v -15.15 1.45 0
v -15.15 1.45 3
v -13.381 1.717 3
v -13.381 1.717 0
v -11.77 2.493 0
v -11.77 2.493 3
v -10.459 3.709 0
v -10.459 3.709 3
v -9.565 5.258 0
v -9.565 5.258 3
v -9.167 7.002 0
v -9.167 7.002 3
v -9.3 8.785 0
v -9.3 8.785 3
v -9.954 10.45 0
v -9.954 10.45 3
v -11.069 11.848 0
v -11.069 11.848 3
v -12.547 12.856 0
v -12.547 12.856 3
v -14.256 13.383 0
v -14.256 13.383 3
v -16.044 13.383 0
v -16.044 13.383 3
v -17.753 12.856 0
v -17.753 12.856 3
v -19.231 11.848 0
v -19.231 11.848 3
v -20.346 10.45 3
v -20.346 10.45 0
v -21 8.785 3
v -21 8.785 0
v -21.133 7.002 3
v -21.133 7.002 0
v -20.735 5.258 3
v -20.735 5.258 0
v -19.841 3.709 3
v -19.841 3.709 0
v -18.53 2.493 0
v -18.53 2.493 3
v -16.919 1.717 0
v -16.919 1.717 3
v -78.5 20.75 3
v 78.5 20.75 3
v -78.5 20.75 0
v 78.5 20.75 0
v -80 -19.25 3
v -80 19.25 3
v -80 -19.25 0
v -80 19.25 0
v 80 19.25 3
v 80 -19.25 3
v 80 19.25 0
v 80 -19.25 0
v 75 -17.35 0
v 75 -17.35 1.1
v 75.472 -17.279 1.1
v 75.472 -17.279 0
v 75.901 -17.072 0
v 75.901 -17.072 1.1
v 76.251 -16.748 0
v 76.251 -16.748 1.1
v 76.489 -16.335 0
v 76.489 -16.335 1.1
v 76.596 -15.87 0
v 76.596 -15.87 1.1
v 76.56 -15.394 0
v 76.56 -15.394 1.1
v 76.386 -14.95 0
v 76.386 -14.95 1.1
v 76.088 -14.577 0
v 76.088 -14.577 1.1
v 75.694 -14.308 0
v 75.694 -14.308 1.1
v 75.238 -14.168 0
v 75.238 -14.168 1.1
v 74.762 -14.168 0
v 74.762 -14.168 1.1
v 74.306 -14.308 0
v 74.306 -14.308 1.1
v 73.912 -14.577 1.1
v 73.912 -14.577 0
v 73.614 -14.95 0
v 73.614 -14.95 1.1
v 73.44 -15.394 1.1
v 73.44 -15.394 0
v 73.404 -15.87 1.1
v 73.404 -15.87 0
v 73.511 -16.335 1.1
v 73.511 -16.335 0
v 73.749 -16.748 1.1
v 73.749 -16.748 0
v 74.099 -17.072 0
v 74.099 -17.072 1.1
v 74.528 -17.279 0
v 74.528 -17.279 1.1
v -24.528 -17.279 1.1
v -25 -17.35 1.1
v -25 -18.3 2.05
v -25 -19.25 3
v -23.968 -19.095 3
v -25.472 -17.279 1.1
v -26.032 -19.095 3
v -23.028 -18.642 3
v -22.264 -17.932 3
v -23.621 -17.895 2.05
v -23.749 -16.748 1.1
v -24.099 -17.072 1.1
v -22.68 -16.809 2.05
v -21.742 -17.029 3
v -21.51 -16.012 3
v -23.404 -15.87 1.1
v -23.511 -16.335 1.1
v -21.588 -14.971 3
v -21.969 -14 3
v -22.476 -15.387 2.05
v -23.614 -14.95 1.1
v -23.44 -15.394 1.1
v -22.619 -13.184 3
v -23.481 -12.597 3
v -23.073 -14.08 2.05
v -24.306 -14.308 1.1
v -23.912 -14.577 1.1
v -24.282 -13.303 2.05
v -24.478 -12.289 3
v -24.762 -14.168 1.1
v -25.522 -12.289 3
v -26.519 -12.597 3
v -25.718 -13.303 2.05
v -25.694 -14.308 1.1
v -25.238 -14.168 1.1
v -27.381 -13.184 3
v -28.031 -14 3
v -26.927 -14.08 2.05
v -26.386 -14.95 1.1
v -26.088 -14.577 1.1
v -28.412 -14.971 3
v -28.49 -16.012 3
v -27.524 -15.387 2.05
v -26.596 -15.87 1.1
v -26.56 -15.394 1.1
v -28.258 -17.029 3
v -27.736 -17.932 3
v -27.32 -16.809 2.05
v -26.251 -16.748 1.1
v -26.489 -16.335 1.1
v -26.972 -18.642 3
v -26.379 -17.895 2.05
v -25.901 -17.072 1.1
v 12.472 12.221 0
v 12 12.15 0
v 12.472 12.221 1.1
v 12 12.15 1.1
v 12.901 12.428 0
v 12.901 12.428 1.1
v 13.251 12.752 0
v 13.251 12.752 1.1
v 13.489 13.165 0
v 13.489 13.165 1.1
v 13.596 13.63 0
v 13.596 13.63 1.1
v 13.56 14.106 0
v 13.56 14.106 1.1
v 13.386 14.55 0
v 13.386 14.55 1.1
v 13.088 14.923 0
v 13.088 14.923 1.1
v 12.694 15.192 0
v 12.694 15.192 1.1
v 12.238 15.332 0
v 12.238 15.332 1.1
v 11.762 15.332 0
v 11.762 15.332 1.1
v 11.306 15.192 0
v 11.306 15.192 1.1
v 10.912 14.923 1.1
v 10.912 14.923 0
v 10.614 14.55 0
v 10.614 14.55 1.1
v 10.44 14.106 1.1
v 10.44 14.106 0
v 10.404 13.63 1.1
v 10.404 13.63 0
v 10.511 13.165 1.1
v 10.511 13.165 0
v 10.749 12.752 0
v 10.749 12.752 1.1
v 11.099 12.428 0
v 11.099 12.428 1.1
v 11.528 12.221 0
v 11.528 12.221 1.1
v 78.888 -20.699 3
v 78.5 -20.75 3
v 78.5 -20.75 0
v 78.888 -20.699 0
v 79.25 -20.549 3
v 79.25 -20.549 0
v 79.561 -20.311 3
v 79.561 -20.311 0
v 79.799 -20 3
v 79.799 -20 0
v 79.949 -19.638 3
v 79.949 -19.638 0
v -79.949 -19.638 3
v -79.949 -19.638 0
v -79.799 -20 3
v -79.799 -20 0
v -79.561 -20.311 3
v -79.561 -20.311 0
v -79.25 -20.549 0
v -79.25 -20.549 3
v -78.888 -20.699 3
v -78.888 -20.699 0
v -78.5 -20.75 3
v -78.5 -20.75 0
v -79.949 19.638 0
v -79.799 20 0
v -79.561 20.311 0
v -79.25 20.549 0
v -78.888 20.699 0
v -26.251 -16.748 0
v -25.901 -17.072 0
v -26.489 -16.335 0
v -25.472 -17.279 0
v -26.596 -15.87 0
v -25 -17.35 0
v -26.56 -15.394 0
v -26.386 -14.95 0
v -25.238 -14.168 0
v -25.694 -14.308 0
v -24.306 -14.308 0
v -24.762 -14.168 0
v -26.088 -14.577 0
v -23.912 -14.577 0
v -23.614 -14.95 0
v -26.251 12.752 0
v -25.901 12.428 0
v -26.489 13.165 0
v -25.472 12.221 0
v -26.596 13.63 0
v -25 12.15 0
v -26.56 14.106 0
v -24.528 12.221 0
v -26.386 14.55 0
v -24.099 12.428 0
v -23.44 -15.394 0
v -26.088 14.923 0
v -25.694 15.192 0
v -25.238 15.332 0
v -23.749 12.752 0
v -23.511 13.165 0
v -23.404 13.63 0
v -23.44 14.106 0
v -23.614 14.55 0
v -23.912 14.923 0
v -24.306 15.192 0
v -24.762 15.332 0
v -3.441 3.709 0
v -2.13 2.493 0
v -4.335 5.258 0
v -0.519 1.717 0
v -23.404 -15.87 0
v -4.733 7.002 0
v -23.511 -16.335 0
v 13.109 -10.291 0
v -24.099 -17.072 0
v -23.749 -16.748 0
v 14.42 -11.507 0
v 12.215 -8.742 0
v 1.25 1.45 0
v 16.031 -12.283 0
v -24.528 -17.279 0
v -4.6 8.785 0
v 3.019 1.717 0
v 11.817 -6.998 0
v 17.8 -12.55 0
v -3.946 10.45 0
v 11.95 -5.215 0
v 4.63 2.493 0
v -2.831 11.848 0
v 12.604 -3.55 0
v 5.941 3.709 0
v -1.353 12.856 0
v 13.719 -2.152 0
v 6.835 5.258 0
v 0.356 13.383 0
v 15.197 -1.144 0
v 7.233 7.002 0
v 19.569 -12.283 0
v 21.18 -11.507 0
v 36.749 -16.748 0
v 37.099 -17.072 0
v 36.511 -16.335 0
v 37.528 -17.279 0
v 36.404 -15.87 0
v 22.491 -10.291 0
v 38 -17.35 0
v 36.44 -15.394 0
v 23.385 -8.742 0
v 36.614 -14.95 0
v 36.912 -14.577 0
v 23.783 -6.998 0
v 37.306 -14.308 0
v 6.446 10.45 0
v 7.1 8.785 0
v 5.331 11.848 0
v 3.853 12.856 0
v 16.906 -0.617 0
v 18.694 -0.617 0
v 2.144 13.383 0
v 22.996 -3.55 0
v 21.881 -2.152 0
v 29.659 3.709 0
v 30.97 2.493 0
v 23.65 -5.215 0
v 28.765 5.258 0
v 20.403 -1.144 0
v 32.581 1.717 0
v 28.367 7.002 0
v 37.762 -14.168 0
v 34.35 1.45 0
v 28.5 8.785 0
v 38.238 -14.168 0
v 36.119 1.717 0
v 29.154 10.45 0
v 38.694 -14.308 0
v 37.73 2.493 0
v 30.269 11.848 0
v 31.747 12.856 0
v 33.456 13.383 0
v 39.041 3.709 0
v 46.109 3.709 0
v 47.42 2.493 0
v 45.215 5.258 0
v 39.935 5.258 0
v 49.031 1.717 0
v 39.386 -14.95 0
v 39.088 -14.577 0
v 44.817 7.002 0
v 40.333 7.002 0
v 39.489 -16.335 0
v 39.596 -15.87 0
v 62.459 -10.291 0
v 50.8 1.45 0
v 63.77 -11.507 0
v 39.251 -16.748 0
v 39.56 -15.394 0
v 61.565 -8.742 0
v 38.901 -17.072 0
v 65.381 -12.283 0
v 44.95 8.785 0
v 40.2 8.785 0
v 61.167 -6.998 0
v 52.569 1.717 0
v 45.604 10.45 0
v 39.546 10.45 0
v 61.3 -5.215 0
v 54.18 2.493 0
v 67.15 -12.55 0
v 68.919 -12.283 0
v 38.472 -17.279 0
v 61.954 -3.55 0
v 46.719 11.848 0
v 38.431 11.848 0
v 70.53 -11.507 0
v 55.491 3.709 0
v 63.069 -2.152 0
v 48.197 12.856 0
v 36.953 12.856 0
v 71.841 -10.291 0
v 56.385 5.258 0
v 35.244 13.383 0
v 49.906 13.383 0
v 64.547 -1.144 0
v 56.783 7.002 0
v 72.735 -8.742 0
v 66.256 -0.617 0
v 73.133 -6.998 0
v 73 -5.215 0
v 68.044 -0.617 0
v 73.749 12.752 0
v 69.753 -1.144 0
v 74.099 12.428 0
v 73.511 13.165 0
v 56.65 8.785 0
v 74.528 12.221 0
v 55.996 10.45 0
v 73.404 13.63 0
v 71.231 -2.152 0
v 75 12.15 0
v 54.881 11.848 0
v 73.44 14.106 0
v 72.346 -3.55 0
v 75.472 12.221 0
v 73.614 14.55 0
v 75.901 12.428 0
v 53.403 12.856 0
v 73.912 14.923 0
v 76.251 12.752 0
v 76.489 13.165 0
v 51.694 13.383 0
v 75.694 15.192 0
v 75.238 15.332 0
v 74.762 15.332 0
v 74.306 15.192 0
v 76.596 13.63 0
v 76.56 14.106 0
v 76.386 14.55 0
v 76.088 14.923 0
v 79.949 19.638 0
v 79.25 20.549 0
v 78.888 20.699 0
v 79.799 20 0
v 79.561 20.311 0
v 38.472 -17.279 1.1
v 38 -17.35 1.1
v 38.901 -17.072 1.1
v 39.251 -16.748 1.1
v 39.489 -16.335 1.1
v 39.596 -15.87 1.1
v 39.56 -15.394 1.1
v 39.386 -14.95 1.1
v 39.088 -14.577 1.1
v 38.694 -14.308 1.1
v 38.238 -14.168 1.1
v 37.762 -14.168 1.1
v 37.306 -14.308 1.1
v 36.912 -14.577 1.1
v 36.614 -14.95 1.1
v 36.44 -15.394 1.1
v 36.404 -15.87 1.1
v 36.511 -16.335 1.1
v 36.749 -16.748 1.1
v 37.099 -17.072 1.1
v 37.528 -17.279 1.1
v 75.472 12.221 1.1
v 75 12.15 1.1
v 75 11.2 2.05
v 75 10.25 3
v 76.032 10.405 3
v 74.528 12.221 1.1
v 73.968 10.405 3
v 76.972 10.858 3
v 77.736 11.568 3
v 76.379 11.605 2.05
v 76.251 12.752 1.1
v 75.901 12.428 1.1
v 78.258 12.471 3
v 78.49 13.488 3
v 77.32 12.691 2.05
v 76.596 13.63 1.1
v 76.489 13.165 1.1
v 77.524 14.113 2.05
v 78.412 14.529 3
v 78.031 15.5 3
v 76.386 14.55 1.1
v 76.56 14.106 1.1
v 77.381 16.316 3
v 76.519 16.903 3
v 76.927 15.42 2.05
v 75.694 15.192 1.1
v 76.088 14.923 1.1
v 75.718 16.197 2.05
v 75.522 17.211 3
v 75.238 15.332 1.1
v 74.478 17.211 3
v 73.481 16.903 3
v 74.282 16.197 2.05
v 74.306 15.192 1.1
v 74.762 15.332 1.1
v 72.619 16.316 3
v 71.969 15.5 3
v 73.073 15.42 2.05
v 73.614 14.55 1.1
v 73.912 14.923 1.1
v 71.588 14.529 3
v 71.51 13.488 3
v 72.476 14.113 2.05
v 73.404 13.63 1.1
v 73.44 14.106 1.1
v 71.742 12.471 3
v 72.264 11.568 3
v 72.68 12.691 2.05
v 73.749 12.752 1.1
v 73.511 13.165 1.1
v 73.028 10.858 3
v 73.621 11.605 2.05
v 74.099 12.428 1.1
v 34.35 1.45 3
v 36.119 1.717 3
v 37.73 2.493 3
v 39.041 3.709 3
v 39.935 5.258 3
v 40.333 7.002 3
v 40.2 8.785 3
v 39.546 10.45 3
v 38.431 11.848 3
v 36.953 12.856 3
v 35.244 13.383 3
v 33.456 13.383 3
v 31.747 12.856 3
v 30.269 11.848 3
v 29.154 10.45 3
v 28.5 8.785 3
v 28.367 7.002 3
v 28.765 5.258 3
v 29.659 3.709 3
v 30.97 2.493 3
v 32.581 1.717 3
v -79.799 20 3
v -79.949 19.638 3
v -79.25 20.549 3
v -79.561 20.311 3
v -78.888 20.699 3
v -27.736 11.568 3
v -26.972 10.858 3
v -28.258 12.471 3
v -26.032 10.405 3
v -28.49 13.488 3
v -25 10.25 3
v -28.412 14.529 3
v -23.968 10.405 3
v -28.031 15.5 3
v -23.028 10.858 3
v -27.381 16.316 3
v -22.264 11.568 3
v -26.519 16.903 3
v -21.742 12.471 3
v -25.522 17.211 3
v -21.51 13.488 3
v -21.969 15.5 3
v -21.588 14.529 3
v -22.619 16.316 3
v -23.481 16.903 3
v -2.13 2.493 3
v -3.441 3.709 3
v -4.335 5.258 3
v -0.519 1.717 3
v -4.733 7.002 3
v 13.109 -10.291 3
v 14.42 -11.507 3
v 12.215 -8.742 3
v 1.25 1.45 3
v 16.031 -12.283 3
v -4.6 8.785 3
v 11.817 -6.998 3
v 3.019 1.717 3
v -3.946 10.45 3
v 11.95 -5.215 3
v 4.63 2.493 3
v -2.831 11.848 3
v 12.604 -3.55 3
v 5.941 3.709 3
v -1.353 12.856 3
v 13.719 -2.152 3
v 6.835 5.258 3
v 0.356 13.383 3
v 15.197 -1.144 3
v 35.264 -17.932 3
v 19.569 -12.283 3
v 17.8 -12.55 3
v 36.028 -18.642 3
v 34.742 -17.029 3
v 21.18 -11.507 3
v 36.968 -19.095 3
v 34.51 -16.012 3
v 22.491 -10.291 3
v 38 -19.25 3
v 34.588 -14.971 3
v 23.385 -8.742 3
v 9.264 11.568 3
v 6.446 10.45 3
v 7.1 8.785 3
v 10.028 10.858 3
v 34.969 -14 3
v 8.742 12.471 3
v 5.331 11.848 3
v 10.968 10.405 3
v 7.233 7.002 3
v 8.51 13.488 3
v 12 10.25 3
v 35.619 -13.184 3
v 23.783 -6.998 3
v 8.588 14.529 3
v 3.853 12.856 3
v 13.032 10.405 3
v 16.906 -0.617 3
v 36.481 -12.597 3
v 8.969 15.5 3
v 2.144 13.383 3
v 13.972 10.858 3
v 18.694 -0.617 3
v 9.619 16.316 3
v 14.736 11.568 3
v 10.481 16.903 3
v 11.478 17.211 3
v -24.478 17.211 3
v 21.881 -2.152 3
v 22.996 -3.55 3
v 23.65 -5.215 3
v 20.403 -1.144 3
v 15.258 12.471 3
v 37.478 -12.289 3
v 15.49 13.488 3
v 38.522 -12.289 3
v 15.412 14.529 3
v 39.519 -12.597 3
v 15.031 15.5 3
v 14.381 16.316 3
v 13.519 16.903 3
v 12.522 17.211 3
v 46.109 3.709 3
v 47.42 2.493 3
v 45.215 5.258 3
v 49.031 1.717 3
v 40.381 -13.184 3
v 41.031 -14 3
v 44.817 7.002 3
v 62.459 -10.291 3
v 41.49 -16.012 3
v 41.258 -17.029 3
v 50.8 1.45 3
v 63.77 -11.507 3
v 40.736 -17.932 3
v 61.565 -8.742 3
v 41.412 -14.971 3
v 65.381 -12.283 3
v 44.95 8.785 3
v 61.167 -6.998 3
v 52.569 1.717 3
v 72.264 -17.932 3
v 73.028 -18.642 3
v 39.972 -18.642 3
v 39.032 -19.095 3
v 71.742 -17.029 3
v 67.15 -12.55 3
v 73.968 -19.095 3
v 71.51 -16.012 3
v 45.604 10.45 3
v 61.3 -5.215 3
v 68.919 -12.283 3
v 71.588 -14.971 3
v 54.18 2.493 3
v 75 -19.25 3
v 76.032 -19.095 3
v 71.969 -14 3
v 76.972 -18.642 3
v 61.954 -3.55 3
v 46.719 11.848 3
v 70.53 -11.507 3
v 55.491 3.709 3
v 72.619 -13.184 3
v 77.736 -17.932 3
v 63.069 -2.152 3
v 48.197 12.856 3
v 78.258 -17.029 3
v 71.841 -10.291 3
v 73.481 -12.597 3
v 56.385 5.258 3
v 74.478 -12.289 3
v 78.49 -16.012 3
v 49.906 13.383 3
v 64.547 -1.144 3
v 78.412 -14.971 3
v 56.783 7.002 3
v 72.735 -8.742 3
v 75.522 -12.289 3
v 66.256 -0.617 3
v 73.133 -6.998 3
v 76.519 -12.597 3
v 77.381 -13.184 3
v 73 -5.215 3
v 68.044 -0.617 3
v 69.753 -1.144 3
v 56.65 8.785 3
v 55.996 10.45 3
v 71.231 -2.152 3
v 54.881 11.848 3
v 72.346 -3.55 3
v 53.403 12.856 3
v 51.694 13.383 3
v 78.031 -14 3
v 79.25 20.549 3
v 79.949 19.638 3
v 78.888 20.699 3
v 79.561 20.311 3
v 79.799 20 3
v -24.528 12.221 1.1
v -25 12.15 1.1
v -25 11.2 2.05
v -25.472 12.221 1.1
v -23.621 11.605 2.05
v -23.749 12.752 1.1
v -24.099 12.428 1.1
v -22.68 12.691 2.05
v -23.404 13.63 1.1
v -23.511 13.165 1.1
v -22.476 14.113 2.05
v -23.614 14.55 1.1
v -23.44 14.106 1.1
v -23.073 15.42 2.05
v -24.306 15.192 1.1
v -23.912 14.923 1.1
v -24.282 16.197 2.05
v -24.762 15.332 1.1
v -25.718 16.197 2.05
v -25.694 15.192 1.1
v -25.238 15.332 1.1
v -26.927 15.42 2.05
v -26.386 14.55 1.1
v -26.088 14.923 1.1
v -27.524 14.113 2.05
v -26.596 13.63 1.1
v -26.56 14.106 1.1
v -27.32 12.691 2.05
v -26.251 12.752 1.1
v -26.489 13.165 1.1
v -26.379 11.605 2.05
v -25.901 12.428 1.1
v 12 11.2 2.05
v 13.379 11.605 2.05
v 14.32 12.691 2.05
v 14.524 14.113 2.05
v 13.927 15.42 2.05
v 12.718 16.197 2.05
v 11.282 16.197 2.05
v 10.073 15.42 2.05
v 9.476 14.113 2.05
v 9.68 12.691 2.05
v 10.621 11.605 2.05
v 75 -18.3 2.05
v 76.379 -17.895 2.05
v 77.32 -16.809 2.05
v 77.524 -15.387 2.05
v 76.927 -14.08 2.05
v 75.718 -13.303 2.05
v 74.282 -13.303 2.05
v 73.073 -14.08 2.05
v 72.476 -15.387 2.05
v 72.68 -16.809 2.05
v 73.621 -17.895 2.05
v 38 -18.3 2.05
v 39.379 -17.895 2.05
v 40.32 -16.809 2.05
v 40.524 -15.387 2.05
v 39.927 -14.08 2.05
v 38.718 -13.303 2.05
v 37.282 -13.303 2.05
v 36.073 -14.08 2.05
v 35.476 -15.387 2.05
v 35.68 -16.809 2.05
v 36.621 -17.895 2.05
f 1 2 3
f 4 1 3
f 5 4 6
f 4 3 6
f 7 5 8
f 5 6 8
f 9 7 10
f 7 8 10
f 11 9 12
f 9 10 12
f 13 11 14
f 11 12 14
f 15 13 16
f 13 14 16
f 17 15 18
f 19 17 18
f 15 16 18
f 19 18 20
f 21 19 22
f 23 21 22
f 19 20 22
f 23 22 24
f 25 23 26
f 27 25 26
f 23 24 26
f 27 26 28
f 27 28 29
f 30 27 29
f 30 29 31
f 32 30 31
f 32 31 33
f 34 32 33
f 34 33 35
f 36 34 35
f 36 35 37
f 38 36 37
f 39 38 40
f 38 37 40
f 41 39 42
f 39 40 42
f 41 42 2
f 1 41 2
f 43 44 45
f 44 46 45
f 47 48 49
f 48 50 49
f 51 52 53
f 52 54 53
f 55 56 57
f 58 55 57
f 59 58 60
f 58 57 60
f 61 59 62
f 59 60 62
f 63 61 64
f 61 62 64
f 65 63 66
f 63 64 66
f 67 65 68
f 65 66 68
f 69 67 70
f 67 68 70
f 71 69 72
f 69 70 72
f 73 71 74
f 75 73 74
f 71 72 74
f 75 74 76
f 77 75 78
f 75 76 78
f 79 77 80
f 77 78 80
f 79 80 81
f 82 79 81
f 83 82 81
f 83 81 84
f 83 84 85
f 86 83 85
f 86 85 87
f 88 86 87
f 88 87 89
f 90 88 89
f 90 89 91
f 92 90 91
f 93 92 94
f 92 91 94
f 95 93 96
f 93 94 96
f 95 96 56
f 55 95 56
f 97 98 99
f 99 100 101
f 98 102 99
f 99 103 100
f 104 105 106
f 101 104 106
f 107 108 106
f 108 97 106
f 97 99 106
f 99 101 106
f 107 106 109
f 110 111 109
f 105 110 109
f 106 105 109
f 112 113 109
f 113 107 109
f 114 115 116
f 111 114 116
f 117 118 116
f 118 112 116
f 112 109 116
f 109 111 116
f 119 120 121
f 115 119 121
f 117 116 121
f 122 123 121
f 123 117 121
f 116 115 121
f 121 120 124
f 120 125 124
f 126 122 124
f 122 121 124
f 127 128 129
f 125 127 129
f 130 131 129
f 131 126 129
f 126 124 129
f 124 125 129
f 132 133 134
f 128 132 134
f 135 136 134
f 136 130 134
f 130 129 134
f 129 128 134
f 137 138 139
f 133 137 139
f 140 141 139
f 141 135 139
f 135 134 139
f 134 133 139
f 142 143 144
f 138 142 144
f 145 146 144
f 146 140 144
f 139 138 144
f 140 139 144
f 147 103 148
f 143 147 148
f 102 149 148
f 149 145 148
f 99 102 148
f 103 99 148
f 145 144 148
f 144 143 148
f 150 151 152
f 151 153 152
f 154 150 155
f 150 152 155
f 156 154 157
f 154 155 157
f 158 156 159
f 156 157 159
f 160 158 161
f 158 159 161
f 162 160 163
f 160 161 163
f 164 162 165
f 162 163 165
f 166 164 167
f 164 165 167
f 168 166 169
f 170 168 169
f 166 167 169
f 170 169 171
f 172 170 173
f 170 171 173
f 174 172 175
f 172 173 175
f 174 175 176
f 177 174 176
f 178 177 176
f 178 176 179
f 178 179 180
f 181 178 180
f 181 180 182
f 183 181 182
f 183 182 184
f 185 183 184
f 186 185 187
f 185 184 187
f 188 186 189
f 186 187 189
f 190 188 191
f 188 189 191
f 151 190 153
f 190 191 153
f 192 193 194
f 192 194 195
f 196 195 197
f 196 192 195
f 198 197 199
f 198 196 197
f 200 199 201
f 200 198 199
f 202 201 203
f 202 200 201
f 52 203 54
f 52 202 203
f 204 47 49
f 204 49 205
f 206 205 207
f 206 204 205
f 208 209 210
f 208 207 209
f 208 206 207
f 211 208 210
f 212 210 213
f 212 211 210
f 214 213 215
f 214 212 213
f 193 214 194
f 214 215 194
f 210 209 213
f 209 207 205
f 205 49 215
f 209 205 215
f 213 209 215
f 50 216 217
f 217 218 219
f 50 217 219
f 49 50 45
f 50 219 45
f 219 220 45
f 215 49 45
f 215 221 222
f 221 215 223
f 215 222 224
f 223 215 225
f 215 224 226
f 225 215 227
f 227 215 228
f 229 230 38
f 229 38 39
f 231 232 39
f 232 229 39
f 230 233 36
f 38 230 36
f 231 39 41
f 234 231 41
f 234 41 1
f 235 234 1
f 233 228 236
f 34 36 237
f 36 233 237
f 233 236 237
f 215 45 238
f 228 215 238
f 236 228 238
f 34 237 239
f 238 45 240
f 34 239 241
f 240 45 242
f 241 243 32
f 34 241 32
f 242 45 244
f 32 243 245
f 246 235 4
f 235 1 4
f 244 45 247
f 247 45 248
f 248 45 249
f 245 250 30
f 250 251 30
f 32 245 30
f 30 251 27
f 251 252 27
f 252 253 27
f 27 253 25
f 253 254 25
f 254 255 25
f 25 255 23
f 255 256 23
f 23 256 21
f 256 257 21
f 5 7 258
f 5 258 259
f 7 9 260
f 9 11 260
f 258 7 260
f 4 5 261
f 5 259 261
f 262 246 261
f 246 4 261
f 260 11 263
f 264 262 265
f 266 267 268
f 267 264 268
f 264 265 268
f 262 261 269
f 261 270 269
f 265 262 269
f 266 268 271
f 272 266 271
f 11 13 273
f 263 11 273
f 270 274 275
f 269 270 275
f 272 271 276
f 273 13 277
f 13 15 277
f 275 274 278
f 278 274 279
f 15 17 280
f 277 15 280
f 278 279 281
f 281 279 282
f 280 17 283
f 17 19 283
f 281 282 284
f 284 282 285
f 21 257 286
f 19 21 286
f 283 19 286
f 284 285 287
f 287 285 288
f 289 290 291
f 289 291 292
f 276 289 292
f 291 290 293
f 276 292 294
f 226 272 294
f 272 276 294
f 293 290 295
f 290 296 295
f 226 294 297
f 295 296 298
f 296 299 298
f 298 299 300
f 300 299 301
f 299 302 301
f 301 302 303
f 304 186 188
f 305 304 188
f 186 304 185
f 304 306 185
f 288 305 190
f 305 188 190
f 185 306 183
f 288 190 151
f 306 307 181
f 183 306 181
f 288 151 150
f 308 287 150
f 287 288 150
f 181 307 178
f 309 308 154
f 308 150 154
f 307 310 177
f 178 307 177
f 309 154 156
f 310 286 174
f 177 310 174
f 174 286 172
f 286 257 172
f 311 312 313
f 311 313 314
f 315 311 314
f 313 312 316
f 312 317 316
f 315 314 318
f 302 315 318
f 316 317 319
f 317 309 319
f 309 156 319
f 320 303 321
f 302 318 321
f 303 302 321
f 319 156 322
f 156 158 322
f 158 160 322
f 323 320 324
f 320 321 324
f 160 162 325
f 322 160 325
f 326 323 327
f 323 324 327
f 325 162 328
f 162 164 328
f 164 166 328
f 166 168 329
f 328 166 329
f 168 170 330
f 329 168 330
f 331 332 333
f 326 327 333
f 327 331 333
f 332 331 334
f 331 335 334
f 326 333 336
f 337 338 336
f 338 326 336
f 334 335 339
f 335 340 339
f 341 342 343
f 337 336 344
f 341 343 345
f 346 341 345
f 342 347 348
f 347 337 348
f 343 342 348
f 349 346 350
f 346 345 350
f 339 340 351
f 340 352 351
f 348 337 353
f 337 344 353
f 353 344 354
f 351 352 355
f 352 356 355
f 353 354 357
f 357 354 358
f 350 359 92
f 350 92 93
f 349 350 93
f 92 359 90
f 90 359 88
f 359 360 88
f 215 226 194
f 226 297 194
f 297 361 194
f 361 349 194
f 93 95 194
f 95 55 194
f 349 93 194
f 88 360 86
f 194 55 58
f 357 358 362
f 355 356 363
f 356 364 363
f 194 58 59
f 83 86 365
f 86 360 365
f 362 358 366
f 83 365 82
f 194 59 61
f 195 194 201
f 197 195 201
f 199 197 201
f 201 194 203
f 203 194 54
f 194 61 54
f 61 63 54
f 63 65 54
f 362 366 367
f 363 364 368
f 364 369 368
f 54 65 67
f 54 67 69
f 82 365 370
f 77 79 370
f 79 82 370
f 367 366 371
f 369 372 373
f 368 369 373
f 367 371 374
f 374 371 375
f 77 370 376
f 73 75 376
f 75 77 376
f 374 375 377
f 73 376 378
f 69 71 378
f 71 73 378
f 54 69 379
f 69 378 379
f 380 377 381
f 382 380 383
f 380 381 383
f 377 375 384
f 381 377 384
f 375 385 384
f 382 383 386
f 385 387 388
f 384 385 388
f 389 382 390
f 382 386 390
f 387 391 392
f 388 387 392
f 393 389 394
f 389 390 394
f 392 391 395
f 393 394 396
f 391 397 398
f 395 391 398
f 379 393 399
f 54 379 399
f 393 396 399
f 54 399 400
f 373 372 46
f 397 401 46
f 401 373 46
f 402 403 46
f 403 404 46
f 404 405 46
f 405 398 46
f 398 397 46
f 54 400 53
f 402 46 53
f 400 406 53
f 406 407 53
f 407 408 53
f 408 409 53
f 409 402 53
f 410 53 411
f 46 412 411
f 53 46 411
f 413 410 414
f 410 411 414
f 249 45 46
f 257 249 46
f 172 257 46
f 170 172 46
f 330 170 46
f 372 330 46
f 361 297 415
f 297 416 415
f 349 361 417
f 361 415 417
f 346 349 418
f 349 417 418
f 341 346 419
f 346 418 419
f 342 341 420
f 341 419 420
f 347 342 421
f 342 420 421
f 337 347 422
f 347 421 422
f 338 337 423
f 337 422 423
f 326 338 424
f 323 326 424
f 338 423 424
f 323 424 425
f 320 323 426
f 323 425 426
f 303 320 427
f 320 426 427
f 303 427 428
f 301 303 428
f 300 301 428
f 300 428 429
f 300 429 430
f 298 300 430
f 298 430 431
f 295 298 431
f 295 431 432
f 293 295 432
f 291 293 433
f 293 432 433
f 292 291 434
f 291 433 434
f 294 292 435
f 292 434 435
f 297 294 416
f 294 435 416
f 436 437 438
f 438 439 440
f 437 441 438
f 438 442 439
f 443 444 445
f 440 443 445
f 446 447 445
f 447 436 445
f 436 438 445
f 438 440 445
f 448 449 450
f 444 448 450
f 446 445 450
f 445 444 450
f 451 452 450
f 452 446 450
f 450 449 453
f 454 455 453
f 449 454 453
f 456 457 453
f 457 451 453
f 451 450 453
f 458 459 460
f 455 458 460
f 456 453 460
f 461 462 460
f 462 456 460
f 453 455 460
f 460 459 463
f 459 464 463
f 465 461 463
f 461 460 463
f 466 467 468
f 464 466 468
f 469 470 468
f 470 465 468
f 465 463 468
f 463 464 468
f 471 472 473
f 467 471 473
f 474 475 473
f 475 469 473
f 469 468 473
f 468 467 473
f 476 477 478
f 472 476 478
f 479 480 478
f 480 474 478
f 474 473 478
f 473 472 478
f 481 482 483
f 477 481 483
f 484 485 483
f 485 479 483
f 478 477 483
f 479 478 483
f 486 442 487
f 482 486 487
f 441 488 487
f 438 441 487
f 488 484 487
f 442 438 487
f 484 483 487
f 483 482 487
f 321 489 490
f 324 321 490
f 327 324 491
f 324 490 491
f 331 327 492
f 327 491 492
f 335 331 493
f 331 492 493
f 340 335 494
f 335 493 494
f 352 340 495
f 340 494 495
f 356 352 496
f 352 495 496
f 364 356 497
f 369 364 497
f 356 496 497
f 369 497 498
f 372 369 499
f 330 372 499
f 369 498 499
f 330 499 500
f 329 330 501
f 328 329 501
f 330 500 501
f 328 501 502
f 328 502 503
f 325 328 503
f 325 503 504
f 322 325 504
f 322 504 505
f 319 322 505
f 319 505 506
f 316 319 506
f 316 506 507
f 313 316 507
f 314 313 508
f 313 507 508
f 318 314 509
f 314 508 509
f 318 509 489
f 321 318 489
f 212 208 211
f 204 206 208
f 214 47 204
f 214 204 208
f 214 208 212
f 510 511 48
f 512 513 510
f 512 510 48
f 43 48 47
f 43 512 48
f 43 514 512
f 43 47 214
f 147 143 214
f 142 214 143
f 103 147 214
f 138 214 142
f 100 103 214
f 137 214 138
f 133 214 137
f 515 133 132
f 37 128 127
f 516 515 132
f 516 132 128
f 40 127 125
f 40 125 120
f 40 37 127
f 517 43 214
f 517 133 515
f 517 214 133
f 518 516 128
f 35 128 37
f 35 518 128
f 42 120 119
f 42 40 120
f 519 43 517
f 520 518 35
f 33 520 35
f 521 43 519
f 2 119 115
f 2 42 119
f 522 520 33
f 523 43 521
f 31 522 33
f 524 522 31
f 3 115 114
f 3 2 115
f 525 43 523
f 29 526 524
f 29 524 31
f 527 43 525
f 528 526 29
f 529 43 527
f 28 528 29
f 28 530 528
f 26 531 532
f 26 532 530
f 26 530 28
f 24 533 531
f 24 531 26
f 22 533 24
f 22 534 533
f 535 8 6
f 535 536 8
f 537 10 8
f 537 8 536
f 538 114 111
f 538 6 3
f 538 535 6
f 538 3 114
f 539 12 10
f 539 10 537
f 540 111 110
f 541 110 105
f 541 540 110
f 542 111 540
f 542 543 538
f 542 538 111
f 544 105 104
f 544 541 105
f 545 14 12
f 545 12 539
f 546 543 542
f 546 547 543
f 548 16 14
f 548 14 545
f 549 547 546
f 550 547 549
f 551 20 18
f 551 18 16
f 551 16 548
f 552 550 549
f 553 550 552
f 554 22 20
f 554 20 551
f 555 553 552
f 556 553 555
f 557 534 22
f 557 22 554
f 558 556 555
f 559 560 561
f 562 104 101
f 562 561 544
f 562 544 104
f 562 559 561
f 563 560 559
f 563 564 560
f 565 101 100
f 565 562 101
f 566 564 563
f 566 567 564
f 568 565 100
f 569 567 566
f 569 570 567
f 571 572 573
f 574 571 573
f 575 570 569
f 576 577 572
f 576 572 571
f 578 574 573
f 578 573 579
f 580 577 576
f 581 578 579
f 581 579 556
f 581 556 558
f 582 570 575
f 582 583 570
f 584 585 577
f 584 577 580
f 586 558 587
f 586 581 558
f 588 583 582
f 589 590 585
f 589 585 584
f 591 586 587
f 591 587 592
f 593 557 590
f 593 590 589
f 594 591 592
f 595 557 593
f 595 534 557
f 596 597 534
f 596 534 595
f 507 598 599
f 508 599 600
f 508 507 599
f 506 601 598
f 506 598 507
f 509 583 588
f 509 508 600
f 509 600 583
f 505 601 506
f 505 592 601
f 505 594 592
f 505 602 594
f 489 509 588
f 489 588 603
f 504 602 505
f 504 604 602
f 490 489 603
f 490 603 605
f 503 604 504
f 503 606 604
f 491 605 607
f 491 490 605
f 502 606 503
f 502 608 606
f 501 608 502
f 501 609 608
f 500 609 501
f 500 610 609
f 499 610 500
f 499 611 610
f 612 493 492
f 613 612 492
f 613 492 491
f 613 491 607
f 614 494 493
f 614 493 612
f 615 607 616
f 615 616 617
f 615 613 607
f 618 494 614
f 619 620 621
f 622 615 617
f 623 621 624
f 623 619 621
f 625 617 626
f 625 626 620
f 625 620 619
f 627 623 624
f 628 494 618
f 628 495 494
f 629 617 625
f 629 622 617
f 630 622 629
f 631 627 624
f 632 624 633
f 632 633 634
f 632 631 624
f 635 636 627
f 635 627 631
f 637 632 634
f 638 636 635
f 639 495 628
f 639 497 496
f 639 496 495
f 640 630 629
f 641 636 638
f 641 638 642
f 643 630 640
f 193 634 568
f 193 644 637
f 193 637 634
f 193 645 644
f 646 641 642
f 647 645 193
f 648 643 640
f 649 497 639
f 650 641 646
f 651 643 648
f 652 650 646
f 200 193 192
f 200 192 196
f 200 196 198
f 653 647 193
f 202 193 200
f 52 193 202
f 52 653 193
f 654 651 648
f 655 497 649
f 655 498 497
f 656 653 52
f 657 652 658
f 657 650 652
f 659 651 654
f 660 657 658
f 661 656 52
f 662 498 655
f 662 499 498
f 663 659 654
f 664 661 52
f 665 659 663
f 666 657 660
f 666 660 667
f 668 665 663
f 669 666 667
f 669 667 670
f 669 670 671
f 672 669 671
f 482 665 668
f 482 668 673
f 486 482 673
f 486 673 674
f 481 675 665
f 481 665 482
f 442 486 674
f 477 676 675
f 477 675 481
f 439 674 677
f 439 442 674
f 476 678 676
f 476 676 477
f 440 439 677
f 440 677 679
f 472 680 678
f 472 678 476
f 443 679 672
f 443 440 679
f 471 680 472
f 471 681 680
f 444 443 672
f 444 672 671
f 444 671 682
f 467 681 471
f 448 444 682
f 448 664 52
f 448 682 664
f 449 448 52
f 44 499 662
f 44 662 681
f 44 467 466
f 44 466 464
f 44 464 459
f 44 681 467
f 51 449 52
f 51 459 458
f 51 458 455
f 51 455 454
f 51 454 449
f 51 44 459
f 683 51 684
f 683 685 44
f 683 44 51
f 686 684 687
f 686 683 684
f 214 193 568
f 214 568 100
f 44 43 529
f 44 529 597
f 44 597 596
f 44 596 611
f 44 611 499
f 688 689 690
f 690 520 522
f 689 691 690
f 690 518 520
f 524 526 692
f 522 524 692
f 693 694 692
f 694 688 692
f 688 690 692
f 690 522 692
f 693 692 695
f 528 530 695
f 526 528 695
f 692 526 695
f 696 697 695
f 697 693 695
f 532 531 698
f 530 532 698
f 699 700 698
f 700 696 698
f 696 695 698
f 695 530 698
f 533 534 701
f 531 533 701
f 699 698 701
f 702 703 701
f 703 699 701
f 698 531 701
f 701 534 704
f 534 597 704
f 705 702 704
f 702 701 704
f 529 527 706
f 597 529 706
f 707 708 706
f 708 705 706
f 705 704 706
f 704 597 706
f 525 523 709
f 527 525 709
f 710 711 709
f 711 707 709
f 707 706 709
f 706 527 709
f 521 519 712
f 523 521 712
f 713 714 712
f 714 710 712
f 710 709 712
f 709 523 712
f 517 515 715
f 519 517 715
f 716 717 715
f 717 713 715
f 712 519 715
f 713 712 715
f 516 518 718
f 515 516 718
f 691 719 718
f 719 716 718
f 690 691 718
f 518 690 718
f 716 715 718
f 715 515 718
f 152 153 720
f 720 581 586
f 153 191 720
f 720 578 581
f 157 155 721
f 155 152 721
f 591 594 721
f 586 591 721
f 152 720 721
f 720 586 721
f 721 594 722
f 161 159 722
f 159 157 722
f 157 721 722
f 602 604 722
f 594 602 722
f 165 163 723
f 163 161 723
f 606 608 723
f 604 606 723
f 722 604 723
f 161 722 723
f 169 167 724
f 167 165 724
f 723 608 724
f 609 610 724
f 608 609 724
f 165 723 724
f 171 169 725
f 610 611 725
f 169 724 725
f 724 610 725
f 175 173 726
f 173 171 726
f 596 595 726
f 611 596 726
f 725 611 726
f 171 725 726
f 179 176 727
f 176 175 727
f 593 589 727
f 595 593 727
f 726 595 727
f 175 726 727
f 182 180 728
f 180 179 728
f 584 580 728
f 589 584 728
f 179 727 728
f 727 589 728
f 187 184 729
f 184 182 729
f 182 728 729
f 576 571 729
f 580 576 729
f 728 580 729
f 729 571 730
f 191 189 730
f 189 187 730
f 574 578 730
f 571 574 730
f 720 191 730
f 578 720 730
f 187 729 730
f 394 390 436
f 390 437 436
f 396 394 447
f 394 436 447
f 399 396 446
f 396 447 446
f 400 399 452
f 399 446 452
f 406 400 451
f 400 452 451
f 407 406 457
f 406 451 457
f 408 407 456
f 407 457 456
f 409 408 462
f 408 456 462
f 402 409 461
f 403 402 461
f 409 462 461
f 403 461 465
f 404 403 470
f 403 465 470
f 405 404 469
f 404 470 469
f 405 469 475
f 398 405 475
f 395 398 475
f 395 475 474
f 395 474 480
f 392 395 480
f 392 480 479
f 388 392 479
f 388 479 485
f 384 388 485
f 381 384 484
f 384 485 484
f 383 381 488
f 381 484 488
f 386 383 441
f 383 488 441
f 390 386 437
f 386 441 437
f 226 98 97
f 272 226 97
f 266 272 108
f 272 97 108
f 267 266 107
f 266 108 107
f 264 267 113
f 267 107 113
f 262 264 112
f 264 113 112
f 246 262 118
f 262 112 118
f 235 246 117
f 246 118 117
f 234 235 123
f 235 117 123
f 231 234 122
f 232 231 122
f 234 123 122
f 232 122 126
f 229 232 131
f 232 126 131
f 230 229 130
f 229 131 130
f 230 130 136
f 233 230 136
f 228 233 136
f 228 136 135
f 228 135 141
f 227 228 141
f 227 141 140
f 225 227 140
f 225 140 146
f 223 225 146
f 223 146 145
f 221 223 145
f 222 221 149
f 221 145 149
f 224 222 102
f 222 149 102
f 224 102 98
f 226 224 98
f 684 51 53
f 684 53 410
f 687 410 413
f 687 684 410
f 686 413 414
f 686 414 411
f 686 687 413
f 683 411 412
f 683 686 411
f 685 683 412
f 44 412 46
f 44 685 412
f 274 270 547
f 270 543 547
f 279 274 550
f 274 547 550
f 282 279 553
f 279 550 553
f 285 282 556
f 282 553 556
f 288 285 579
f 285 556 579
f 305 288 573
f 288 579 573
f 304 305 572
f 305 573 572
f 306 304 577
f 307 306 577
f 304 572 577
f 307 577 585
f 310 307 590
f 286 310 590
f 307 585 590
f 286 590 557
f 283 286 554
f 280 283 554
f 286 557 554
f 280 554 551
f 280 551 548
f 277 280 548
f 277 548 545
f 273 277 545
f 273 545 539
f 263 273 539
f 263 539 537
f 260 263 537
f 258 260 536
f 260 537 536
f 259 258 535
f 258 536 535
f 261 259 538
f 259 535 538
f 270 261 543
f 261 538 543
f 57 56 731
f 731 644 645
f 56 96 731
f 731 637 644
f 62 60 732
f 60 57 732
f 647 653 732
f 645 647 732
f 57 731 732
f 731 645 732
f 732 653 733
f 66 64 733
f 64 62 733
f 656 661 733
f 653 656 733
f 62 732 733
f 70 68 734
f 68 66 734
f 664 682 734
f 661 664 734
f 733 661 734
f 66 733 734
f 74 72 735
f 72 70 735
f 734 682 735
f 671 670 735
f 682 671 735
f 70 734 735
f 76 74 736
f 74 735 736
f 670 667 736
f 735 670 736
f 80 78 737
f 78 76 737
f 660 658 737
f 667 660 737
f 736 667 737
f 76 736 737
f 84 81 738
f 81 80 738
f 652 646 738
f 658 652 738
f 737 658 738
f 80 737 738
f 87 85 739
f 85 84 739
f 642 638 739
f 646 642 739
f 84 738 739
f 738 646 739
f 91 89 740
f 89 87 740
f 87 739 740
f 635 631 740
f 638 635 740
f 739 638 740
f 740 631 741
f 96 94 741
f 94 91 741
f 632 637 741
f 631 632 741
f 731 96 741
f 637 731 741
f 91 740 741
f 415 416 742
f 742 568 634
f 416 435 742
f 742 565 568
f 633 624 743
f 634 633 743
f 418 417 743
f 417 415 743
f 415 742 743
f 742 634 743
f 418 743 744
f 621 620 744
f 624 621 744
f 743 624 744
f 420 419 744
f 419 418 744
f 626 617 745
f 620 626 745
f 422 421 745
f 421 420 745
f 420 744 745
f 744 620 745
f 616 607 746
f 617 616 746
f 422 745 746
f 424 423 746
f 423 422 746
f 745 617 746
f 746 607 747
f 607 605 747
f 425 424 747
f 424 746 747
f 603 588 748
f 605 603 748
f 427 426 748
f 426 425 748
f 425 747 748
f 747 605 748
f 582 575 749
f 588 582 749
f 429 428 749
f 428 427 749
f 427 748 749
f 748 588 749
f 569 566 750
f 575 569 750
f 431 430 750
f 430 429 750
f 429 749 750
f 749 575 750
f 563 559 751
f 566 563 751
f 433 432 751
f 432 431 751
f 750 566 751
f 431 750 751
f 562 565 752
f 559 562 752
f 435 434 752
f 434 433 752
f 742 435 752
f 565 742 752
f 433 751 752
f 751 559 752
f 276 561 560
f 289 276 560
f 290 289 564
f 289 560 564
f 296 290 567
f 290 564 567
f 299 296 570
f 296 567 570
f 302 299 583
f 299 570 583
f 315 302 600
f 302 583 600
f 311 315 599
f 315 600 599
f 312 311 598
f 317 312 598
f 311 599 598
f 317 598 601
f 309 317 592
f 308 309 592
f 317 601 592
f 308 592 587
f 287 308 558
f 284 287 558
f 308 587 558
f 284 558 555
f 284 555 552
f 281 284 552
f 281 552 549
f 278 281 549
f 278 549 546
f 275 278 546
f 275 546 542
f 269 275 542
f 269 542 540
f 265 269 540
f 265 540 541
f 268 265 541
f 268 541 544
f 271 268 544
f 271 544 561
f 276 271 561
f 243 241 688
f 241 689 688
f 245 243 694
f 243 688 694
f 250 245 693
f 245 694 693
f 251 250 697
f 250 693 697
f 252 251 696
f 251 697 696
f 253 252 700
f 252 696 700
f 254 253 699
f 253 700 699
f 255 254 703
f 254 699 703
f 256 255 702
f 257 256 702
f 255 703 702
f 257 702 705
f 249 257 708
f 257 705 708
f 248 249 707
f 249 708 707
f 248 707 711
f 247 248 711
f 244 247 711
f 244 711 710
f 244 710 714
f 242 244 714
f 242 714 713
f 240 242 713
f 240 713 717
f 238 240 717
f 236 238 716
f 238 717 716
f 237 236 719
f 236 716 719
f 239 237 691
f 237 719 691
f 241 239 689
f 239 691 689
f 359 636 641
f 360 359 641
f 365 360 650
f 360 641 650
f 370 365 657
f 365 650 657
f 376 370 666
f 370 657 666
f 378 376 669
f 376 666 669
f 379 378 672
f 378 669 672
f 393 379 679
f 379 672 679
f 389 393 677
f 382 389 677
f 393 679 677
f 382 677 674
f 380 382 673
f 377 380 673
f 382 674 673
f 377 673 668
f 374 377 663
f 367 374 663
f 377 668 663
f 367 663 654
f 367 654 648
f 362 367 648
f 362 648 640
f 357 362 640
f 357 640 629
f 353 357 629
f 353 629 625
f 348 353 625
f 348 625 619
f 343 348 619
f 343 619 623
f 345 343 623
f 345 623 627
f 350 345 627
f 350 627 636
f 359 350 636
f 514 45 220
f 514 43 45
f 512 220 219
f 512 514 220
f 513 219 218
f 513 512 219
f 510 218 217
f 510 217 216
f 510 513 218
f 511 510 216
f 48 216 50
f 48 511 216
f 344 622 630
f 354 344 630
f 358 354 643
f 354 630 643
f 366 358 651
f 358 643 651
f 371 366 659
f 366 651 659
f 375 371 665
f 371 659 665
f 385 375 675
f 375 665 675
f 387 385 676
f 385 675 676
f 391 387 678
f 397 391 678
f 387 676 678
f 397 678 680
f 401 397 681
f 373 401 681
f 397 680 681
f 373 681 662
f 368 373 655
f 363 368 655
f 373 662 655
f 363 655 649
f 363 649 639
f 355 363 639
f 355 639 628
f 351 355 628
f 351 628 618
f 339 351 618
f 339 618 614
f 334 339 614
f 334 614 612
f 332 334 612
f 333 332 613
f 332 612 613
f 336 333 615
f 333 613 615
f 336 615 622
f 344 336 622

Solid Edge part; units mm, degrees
sketch "Sketch1" plane through (0, 0, 0) normal (0, 0, 1) x (1, 0, 0)
  line L0 (-80, -20.75) -> (80, -20.75)
  line L1 (80, -20.75) -> (80, 20.75)
  line L2 (80, 20.75) -> (-80, 20.75)
  line L3 (-80, 20.75) -> (-80, -20.75)
  dimension "D1" = 41.5
  dimension "D2" = 160
extrude "Protrusion1" add sketch "Sketch1" along normal blind 3
fillet "Round_1" radius 1.5 4 edges at (-80, -20.75, 1.5) (-80, 20.75, 1.5) (80, -20.75, 1.5) (80, 20.75, 1.5)
hole "Hole_1" at (-15.15, 7.45, 3) direction (0, 0, -1) diameter 12 end through all
hole "Hole1" at (1.25, 7.45, 3) direction (0, 0, -1) diameter 12 end through all
hole "Hole2" at (17.8, -6.55, 3) direction (0, 0, -1) diameter 12 end through all
hole "Hole3" at (34.35, 7.45, 3) direction (0, 0, -1) diameter 12 end through all
hole "Hole4" at (50.8, 7.45, 3) direction (0, 0, -1) diameter 12 end through all
hole "Hole5" at (67.15, -6.55, 3) direction (0, 0, -1) diameter 12 end through all
hole "Hole_7" at (75, -15.75, 3) direction (0, 0, -1) diameter 3.2 end up to next countersink diameter 7 countersink angle 90
hole "Hole6" at (75, 13.75, 3) direction (0, 0, -1) diameter 3.2 end up to next countersink diameter 7 countersink angle 90
hole "Hole7" at (-25, -15.75, 3) direction (0, 0, -1) diameter 3.2 end up to next countersink diameter 7 countersink angle 90
hole "Hole8" at (-25, 13.75, 3) direction (0, 0, -1) diameter 3.2 end up to next countersink diameter 7 countersink angle 90
hole "Hole9" at (38, -15.75, 3) direction (0, 0, -1) diameter 3.2 end up to next countersink diameter 7 countersink angle 90
hole "Hole10" at (12, 13.75, 3) direction (0, 0, -1) diameter 3.2 end up to next countersink diameter 7 countersink angle 90
properties material "Stainless Steel, 304"
